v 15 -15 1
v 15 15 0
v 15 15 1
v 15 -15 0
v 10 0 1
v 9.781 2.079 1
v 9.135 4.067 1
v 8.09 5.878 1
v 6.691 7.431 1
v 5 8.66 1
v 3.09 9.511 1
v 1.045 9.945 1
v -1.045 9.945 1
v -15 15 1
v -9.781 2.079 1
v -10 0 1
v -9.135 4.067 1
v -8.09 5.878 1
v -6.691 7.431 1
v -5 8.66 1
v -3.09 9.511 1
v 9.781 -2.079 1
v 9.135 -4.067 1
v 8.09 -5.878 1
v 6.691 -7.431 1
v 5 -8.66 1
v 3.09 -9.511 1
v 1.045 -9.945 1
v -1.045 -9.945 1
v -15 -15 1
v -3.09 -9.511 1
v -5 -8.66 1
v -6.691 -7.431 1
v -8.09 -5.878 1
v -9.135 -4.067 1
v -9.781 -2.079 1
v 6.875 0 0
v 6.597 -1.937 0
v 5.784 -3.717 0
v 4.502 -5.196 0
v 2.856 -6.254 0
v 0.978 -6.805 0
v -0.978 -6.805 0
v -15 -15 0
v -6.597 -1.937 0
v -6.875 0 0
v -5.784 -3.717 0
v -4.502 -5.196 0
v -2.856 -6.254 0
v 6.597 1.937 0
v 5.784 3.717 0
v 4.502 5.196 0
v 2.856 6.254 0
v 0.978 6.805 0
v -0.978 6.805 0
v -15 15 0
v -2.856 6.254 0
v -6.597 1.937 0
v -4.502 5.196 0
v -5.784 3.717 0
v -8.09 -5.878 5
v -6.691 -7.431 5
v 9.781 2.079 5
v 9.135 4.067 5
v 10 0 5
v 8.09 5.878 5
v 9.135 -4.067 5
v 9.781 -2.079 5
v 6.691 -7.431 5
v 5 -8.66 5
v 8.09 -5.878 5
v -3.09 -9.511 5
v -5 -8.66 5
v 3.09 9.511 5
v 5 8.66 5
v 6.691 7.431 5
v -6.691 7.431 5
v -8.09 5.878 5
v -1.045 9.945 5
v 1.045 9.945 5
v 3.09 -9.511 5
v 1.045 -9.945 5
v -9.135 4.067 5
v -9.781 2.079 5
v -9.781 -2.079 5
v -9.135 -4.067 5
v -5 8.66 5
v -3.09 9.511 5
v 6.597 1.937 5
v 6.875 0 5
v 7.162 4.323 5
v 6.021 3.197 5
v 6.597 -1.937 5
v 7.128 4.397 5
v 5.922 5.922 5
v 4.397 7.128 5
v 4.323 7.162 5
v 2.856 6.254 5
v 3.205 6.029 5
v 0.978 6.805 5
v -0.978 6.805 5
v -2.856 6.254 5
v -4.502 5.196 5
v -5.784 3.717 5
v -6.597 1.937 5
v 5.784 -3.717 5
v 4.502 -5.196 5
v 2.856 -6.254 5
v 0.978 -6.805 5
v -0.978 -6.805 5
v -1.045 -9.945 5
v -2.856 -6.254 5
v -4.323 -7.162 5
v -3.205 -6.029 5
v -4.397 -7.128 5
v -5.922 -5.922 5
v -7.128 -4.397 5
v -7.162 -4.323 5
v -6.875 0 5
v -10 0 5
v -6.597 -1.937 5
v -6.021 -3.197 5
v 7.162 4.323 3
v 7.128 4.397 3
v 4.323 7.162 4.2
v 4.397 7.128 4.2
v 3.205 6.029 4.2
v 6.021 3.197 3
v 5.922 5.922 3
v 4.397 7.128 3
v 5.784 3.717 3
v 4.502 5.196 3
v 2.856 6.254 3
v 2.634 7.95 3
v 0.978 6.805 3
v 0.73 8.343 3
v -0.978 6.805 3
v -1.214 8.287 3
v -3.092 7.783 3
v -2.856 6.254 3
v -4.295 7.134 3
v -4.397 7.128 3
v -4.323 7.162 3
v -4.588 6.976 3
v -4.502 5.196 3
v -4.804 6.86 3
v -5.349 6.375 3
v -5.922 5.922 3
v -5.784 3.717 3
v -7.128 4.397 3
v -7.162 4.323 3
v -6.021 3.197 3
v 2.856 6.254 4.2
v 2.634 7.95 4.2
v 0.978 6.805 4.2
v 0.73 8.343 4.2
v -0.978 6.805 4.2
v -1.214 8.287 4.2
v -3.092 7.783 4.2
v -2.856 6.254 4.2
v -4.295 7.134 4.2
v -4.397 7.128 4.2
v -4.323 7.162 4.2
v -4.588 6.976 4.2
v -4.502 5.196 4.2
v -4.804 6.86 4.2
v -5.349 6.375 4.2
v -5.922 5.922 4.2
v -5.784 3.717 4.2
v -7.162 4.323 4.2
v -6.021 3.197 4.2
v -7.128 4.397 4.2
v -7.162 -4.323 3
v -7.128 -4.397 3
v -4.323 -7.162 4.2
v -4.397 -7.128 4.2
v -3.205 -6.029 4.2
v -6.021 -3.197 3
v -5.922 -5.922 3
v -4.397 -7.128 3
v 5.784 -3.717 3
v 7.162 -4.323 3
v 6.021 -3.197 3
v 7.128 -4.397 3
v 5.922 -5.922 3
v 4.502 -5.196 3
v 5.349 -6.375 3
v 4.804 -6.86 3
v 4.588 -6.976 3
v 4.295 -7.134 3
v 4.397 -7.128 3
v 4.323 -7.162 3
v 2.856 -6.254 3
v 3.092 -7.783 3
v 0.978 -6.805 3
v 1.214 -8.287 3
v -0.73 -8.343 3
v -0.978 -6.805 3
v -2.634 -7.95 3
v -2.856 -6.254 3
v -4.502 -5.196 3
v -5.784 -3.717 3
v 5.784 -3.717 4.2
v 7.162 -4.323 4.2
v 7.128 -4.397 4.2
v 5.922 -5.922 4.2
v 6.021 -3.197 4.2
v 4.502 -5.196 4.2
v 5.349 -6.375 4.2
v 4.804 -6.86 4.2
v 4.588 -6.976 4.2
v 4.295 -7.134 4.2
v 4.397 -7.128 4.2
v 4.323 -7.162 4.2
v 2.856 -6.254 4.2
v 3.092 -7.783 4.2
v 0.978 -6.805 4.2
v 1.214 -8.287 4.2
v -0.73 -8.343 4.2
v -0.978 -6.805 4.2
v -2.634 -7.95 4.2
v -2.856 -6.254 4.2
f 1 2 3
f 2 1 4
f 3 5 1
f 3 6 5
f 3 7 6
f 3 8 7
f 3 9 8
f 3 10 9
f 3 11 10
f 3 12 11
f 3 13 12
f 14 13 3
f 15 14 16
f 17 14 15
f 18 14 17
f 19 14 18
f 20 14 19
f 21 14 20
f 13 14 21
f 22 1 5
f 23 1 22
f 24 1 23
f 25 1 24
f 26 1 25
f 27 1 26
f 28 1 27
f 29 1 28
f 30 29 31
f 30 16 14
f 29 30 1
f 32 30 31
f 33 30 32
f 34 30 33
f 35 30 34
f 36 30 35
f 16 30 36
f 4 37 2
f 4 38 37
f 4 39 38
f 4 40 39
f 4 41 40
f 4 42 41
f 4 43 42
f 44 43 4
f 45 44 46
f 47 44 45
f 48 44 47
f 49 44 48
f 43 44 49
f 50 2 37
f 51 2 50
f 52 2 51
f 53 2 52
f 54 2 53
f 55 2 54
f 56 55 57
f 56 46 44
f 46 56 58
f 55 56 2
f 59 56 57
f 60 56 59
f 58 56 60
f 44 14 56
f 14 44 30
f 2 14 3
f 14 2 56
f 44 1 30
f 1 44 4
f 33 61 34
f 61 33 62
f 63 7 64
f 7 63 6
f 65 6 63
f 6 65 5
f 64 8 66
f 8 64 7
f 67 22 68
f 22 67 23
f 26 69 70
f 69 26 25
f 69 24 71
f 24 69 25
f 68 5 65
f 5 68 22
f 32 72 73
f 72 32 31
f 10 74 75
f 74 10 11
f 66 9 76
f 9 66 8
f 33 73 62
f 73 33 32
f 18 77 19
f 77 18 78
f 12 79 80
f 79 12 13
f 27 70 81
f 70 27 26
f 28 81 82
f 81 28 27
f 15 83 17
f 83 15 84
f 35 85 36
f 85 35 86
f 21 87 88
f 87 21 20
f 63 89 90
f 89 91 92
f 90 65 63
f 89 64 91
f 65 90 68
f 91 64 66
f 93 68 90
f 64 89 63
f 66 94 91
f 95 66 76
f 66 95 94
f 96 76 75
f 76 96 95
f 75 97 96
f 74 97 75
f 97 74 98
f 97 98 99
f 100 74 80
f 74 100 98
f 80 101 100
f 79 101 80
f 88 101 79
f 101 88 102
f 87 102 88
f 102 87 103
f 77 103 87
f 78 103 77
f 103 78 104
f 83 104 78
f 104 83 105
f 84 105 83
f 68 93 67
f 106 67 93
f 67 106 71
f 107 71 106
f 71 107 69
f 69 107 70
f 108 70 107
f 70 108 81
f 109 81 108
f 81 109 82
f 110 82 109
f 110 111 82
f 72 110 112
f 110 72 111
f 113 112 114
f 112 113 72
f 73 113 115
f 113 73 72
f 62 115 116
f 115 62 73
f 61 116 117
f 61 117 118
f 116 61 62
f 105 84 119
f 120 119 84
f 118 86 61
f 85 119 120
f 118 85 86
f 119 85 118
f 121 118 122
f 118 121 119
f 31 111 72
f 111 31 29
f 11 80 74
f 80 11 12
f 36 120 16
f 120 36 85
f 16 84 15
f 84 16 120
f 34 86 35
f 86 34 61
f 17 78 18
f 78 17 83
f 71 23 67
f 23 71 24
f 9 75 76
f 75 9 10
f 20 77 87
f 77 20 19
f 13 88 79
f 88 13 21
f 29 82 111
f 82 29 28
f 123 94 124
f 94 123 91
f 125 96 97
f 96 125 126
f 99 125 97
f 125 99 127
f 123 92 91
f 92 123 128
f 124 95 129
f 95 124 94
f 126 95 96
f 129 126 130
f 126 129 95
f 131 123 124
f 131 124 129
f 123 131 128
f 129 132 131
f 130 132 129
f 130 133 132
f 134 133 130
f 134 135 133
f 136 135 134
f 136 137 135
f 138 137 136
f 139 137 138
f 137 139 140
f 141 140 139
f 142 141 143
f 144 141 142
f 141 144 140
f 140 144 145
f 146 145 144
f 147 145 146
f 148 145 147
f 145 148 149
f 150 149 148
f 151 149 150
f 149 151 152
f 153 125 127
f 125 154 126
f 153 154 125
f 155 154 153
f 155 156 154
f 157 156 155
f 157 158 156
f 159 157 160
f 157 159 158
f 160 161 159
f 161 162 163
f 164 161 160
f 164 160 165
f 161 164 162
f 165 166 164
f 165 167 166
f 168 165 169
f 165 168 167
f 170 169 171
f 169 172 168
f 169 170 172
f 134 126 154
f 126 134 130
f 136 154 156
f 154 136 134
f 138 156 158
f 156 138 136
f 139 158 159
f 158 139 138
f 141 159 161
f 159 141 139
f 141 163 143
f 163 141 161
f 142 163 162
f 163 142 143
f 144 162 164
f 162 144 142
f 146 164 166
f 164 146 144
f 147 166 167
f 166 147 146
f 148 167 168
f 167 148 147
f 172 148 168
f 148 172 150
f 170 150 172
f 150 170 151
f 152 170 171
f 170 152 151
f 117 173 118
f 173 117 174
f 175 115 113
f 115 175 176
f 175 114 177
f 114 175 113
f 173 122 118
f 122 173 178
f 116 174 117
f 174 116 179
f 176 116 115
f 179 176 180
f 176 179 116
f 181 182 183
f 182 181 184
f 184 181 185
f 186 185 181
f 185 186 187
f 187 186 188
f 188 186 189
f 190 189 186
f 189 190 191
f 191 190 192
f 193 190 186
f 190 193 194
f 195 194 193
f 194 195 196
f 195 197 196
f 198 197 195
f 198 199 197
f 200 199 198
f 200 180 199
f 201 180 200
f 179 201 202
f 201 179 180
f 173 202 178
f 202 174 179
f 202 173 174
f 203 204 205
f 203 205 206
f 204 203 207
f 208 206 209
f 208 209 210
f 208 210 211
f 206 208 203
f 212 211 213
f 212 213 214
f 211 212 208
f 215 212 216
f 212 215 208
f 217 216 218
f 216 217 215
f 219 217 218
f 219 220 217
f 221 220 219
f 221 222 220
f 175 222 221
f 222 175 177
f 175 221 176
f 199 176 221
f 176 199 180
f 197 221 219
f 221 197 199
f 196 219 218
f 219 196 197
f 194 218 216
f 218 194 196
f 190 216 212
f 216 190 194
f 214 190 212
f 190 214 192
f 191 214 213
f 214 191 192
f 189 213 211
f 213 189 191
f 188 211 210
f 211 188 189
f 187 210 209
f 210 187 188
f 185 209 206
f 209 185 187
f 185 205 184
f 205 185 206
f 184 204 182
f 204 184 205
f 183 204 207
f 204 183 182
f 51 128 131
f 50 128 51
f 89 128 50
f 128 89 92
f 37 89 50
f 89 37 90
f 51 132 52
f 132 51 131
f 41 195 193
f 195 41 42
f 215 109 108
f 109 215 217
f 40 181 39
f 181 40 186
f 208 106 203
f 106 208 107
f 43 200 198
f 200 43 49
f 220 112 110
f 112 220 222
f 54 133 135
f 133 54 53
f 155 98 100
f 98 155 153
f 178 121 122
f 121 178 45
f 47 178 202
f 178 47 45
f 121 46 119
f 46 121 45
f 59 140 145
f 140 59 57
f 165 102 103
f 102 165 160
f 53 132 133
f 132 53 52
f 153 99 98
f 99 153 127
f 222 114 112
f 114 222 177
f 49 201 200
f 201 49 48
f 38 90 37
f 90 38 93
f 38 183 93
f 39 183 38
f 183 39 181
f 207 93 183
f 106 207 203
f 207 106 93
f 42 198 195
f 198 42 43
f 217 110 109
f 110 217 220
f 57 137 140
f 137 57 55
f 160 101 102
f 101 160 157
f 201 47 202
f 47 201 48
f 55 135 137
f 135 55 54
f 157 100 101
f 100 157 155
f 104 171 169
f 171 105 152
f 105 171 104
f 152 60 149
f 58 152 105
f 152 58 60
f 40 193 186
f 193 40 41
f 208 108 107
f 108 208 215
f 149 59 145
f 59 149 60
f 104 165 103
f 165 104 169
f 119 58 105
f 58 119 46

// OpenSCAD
module point(x, y)
{
  translate([x, y])
    circle(0.01);
}

module bracket_a(w, h)
{
  translate([-w/2, -h/2, 0])
    cube([w, h, 1]);
  cylinder(r=10, h=5);
}

module slice(radius, width)
{
  intersection()
  {
    circle(r = radius);
    hull()
    {
      translate([radius, 0, 0])
      {
        point(0, width/2);
        point(0, -width/2);
      }
      circle(d=width);
    }
  }
}

module scope_threads(scope_radius, scope_mount_height, angle, carrier_width, carrier_height)
{
  rad = scope_radius + 1.5;
  rotate([0, 0, angle])
  {
    translate([0, 0, scope_mount_height-1.5])
      linear_extrude(height = carrier_height+1)
        slice(rad, carrier_width);

    translate([0, 0, scope_mount_height-2])
      linear_extrude(height = carrier_height)
      {
        slice(rad, carrier_width);
        rotate([0, 0, 90])
          slice(rad, carrier_width);
        intersection()
        {
          circle(rad);
          square([rad, rad]);
        }
      }
  }
}

module scope_bracket(scope_radius, scope_mount_height)
{
  translate([0, 0, -1])
    cylinder(r=scope_radius, h=scope_mount_height+2);
  scope_threads(scope_radius, scope_mount_height, 45, 4, 1.2);
  scope_threads(scope_radius, scope_mount_height, -135, 4, 1.2);
}

module bubblescope_mount()
{
  difference()
  {
    bracket_a(30, 30);
    scope_bracket(6.875, 5);
  }
}

bubblescope_mount();
